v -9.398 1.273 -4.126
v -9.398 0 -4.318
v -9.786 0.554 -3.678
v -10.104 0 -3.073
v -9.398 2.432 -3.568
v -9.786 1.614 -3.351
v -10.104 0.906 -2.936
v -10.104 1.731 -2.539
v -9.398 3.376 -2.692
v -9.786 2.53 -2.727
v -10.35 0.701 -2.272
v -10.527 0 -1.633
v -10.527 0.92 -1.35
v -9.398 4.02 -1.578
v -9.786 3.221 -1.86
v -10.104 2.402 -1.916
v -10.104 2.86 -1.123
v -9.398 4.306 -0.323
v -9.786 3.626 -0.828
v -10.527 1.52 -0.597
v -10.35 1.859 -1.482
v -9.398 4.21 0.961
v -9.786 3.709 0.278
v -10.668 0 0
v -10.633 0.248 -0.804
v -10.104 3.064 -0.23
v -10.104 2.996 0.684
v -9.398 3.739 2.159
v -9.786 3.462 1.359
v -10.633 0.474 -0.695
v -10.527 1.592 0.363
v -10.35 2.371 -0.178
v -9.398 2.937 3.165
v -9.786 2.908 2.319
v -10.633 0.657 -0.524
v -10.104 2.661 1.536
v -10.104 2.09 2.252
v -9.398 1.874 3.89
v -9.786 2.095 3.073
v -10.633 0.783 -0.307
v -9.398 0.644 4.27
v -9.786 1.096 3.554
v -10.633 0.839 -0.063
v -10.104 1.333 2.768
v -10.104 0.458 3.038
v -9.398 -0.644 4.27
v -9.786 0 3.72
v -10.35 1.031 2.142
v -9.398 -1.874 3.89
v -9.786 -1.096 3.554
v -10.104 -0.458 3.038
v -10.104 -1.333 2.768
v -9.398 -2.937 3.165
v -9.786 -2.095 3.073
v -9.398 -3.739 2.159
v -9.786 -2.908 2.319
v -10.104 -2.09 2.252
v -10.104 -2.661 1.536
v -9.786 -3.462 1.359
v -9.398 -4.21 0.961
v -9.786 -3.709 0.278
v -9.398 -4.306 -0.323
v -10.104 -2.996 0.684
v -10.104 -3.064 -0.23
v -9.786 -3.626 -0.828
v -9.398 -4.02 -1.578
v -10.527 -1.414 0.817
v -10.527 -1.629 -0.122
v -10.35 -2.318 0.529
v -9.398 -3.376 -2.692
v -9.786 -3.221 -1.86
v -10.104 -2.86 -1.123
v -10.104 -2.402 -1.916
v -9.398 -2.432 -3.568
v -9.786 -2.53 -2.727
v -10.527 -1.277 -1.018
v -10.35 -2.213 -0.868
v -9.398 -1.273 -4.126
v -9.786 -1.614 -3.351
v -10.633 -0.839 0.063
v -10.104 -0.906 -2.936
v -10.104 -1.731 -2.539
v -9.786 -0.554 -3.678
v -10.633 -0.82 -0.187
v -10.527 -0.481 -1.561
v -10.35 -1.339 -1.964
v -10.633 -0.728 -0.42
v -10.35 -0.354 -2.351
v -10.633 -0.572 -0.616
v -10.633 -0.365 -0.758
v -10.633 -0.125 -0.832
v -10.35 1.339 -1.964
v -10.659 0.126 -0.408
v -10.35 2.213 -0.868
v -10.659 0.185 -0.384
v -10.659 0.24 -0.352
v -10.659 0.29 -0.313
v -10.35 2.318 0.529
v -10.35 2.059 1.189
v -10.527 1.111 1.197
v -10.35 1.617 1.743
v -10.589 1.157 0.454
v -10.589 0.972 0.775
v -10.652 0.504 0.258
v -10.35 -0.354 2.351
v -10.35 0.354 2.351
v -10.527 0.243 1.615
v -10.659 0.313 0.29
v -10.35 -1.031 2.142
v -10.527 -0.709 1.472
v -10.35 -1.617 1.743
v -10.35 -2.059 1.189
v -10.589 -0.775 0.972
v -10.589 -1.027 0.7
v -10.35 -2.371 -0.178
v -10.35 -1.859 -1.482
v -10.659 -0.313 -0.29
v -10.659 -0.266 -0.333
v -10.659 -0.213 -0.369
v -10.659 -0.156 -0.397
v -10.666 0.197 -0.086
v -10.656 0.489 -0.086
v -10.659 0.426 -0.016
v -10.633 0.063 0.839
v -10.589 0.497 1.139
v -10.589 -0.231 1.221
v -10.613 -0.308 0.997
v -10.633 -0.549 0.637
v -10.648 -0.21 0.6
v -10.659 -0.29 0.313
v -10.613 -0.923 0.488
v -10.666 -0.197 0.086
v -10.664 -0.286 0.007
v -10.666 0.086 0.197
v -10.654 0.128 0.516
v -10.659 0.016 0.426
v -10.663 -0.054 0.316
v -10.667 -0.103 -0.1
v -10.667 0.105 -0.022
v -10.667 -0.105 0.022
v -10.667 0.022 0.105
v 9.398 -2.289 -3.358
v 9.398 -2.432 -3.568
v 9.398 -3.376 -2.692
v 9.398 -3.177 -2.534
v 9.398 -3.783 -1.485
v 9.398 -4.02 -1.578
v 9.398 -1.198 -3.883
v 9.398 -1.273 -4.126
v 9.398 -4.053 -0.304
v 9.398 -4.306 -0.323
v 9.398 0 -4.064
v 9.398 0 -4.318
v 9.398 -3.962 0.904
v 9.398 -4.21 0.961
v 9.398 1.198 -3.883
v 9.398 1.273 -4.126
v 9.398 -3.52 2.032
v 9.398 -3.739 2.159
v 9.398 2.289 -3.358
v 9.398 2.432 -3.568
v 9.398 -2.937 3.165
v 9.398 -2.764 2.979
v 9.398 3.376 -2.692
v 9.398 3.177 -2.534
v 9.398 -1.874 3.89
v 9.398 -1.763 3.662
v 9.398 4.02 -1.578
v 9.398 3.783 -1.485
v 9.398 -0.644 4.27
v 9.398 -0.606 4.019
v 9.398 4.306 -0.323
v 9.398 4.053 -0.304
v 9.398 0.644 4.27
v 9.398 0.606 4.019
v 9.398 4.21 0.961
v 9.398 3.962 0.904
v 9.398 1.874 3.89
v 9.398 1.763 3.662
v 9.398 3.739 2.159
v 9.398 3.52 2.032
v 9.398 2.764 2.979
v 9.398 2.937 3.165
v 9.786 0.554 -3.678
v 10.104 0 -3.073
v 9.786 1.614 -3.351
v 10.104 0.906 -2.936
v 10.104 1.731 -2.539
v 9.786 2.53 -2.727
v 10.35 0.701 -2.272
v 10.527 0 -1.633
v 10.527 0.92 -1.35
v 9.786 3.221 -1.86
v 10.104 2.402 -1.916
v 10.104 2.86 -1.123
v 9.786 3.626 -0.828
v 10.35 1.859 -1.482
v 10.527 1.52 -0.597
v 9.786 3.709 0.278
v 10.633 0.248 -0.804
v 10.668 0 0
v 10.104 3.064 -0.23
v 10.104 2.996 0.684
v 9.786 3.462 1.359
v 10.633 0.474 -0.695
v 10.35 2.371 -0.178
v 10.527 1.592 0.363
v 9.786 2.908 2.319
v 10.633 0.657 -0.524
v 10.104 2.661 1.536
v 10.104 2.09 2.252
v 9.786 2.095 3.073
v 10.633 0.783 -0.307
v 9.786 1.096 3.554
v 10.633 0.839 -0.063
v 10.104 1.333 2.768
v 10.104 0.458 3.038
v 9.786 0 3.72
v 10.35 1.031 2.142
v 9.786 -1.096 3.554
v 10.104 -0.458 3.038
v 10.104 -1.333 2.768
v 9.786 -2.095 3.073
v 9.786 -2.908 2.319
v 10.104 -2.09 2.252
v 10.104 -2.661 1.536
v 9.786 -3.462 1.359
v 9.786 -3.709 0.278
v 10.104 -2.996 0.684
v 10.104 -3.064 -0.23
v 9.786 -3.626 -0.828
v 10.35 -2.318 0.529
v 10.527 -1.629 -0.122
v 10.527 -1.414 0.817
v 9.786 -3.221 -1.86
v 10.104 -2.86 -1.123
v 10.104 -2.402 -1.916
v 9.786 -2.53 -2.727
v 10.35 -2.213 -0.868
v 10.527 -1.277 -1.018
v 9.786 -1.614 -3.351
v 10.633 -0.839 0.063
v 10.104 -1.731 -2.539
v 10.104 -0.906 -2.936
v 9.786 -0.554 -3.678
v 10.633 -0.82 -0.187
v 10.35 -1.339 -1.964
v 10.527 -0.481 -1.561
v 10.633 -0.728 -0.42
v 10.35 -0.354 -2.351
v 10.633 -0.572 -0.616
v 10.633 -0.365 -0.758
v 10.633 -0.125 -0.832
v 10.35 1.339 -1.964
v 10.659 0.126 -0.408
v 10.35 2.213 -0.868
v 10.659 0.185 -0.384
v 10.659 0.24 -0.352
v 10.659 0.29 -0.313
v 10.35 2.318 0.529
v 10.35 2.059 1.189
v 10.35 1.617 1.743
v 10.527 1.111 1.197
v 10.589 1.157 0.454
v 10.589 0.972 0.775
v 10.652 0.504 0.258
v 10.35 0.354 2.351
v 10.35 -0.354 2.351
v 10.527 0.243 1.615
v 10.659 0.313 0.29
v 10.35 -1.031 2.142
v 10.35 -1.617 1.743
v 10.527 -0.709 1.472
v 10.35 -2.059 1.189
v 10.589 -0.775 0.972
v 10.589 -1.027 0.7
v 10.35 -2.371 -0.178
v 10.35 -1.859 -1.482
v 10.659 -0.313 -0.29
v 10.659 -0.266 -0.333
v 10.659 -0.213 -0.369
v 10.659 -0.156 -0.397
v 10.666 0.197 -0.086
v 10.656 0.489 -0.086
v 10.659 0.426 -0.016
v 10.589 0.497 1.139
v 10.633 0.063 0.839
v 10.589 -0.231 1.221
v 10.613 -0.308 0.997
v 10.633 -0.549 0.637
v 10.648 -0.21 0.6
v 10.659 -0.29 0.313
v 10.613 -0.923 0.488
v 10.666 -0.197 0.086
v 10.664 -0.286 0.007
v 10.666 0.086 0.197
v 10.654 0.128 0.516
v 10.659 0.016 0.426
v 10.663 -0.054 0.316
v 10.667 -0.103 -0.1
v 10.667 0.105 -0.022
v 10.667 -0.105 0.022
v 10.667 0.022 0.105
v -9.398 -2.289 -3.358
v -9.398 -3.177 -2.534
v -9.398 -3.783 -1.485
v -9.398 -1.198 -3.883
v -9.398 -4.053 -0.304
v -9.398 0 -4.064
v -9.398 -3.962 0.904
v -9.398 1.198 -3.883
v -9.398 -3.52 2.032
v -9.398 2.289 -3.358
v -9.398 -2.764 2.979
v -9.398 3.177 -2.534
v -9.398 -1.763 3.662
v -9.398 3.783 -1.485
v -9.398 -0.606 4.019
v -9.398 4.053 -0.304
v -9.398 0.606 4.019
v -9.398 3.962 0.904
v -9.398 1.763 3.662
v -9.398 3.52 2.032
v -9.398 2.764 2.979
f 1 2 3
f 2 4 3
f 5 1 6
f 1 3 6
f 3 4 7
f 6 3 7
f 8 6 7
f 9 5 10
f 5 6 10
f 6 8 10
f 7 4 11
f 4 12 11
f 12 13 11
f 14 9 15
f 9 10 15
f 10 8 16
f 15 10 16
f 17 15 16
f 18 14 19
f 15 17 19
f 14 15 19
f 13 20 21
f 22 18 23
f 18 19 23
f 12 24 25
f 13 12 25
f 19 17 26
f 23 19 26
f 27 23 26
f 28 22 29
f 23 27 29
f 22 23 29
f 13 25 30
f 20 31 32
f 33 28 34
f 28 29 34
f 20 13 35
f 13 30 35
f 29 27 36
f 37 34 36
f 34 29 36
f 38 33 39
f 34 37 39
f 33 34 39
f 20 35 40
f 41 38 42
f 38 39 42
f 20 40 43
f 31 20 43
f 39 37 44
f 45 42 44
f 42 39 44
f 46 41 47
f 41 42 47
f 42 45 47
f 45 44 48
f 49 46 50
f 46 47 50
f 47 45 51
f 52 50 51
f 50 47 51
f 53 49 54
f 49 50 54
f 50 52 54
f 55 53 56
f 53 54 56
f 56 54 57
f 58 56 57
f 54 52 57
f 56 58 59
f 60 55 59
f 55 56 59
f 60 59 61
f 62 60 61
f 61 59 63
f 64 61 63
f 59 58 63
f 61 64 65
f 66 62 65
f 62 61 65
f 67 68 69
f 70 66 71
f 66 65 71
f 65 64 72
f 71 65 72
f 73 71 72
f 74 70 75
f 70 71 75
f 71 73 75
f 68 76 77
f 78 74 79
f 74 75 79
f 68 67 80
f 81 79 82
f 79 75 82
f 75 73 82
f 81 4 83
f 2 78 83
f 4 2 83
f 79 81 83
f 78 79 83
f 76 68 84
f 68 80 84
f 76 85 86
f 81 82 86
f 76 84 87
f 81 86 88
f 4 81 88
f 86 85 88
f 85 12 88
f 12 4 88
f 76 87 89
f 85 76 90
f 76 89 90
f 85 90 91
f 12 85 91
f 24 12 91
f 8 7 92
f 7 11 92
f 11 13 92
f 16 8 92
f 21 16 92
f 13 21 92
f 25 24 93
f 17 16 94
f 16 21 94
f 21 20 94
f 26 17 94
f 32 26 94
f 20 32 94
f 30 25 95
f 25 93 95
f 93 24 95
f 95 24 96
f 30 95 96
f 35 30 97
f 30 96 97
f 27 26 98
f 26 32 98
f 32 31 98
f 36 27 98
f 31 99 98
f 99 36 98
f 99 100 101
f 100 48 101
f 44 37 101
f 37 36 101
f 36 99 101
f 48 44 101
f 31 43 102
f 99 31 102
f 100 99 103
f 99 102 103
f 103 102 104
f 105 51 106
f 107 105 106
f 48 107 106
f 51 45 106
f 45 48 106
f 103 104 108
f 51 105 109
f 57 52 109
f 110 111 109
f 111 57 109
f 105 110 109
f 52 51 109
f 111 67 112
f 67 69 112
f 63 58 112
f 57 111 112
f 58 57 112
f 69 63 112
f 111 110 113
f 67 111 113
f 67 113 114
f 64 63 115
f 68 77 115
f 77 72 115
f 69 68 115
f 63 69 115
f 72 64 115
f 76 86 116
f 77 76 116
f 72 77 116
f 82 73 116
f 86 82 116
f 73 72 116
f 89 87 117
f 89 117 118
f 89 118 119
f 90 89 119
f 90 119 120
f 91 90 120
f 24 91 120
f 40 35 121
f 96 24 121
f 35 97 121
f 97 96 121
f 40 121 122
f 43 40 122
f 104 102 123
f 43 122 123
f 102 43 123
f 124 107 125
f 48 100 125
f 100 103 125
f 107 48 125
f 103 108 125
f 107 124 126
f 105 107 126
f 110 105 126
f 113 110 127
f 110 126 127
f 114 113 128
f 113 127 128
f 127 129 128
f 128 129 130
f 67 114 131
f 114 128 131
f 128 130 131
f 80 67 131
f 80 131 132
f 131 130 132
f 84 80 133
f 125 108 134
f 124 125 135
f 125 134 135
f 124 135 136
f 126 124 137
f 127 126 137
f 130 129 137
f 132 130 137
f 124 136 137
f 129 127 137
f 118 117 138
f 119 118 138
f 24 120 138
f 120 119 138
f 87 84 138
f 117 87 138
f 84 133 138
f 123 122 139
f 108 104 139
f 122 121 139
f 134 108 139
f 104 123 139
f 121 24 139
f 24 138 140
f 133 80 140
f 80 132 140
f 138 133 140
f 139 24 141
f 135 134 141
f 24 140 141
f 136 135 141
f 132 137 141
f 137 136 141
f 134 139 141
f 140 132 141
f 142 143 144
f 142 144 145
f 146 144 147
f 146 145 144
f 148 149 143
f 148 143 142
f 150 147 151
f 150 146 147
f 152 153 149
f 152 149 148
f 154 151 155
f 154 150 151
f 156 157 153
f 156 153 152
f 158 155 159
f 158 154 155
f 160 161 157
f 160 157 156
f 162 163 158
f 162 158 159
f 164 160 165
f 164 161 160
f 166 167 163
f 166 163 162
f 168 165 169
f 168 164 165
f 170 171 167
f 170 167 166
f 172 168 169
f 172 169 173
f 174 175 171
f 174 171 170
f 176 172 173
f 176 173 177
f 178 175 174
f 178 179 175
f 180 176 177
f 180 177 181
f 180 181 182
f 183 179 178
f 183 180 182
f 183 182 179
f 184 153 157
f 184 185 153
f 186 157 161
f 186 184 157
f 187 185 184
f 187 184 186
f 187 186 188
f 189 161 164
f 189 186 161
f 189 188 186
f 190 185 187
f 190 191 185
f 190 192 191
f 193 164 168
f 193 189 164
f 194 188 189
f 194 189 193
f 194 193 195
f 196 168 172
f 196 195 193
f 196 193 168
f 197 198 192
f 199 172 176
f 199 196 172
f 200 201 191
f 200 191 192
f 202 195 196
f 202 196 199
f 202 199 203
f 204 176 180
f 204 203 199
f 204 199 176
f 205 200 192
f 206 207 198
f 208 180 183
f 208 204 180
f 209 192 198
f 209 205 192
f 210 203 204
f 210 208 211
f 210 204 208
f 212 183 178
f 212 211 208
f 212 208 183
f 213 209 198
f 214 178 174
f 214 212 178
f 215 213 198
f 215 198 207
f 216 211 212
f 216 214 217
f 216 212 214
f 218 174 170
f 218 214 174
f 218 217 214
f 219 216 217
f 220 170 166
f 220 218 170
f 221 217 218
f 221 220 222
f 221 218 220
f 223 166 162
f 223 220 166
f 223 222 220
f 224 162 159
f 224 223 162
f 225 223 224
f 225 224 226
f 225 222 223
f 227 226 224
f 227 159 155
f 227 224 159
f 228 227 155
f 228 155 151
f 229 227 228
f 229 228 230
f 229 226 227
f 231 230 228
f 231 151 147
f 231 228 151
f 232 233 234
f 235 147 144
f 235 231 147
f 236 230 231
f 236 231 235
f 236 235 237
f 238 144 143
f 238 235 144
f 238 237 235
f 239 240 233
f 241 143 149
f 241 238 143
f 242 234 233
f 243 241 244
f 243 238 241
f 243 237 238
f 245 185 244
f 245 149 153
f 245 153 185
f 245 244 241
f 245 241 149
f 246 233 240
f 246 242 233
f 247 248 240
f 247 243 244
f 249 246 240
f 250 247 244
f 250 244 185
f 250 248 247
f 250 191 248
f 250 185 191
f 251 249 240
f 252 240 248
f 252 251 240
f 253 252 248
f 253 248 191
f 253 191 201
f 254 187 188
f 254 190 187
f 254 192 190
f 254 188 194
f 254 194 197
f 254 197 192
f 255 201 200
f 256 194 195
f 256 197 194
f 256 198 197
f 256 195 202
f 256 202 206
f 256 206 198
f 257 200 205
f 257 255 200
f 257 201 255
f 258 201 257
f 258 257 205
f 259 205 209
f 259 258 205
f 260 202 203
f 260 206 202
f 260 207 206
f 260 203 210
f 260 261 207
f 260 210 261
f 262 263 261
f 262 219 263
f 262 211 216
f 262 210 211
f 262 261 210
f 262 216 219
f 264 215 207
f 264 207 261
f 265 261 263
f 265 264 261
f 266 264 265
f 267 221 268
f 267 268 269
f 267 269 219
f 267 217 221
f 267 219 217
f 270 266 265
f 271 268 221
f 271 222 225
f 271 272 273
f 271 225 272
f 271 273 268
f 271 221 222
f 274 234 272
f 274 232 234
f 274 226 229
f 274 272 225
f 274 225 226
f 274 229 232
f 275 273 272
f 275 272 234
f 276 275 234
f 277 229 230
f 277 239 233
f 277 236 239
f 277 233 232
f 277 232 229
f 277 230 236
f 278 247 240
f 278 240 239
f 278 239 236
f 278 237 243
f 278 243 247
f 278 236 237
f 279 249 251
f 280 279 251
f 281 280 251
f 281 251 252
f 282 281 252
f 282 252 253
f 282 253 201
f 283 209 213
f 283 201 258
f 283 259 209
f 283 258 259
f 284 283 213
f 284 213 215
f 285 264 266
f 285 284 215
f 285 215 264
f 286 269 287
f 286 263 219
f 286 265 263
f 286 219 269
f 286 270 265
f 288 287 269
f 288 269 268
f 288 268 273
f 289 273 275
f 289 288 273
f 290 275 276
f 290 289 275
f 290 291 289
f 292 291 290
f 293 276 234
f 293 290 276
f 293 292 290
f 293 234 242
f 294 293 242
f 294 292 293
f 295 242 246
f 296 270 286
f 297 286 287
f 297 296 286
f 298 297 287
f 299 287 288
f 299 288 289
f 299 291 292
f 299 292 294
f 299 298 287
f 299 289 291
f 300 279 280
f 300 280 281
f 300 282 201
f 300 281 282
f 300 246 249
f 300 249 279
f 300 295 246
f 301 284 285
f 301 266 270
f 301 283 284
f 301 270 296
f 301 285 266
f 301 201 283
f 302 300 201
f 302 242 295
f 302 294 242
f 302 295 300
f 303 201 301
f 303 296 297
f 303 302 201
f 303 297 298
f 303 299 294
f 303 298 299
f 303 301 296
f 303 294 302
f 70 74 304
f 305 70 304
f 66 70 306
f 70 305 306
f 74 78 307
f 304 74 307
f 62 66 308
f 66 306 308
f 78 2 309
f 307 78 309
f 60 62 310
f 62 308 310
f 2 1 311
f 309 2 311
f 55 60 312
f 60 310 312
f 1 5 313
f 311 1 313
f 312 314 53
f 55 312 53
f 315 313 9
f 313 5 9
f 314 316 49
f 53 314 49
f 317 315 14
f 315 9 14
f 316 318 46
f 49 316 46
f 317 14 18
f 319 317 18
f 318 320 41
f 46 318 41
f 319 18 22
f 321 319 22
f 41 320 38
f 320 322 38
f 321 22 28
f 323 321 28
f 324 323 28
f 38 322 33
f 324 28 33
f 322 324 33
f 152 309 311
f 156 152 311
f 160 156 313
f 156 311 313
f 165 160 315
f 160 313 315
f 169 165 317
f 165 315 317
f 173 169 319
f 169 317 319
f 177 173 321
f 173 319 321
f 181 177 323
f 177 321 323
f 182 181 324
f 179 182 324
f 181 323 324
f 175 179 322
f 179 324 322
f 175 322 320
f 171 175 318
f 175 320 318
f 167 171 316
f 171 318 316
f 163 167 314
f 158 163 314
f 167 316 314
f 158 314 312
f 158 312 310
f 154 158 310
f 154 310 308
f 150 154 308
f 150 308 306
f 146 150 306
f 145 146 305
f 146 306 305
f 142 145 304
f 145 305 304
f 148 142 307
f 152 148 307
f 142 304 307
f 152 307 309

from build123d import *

# Parameters (mm, degrees)
BOSS_EXTRUDE1_DEPTH      = 9.398
BOSS_EXTRUDE1_DEPTH_BACK = 9.398
SKETCH1_R                = 4.064


with BuildPart() as part:
    # Sketch1 → Boss-Extrude1 (new, two sides: drawn at the far end of the back side and taken through both)
    with BuildSketch(Plane(origin=(0, 0, 0), x_dir=(0, 0, -1), z_dir=(1, 0, 0)).offset(-BOSS_EXTRUDE1_DEPTH_BACK)):
        Circle(SKETCH1_R)
    extrude(amount=BOSS_EXTRUDE1_DEPTH + BOSS_EXTRUDE1_DEPTH_BACK)

    # Sketch5 → Revolve1 (revolve)
    with BuildSketch(Plane(origin=(0, 0, 0), x_dir=(1, 0, 0), z_dir=(0, 1, 0))):
        with BuildLine():
            Line((9.398, 0), (9.398, 4.318))
            add(Edge.make_bspline(
                [(9.398, 4.318), (10.668, 2.595439575), (10.668, 0)],
                knots=[0, 0, 0, 1, 1, 1], degree=2))
            Line((10.668, 0), (9.398, 0))
        make_face()
    revolve1 = revolve(axis=Axis((9.398, 0, 0), (1, 0, 0)))

    # Mirror1: Revolve1 across plane
    add(revolve1.mirror(Plane(origin=(0, 0, 0), x_dir=(0, 0, 1), z_dir=(1, 0, 0))))


solid = part.part
